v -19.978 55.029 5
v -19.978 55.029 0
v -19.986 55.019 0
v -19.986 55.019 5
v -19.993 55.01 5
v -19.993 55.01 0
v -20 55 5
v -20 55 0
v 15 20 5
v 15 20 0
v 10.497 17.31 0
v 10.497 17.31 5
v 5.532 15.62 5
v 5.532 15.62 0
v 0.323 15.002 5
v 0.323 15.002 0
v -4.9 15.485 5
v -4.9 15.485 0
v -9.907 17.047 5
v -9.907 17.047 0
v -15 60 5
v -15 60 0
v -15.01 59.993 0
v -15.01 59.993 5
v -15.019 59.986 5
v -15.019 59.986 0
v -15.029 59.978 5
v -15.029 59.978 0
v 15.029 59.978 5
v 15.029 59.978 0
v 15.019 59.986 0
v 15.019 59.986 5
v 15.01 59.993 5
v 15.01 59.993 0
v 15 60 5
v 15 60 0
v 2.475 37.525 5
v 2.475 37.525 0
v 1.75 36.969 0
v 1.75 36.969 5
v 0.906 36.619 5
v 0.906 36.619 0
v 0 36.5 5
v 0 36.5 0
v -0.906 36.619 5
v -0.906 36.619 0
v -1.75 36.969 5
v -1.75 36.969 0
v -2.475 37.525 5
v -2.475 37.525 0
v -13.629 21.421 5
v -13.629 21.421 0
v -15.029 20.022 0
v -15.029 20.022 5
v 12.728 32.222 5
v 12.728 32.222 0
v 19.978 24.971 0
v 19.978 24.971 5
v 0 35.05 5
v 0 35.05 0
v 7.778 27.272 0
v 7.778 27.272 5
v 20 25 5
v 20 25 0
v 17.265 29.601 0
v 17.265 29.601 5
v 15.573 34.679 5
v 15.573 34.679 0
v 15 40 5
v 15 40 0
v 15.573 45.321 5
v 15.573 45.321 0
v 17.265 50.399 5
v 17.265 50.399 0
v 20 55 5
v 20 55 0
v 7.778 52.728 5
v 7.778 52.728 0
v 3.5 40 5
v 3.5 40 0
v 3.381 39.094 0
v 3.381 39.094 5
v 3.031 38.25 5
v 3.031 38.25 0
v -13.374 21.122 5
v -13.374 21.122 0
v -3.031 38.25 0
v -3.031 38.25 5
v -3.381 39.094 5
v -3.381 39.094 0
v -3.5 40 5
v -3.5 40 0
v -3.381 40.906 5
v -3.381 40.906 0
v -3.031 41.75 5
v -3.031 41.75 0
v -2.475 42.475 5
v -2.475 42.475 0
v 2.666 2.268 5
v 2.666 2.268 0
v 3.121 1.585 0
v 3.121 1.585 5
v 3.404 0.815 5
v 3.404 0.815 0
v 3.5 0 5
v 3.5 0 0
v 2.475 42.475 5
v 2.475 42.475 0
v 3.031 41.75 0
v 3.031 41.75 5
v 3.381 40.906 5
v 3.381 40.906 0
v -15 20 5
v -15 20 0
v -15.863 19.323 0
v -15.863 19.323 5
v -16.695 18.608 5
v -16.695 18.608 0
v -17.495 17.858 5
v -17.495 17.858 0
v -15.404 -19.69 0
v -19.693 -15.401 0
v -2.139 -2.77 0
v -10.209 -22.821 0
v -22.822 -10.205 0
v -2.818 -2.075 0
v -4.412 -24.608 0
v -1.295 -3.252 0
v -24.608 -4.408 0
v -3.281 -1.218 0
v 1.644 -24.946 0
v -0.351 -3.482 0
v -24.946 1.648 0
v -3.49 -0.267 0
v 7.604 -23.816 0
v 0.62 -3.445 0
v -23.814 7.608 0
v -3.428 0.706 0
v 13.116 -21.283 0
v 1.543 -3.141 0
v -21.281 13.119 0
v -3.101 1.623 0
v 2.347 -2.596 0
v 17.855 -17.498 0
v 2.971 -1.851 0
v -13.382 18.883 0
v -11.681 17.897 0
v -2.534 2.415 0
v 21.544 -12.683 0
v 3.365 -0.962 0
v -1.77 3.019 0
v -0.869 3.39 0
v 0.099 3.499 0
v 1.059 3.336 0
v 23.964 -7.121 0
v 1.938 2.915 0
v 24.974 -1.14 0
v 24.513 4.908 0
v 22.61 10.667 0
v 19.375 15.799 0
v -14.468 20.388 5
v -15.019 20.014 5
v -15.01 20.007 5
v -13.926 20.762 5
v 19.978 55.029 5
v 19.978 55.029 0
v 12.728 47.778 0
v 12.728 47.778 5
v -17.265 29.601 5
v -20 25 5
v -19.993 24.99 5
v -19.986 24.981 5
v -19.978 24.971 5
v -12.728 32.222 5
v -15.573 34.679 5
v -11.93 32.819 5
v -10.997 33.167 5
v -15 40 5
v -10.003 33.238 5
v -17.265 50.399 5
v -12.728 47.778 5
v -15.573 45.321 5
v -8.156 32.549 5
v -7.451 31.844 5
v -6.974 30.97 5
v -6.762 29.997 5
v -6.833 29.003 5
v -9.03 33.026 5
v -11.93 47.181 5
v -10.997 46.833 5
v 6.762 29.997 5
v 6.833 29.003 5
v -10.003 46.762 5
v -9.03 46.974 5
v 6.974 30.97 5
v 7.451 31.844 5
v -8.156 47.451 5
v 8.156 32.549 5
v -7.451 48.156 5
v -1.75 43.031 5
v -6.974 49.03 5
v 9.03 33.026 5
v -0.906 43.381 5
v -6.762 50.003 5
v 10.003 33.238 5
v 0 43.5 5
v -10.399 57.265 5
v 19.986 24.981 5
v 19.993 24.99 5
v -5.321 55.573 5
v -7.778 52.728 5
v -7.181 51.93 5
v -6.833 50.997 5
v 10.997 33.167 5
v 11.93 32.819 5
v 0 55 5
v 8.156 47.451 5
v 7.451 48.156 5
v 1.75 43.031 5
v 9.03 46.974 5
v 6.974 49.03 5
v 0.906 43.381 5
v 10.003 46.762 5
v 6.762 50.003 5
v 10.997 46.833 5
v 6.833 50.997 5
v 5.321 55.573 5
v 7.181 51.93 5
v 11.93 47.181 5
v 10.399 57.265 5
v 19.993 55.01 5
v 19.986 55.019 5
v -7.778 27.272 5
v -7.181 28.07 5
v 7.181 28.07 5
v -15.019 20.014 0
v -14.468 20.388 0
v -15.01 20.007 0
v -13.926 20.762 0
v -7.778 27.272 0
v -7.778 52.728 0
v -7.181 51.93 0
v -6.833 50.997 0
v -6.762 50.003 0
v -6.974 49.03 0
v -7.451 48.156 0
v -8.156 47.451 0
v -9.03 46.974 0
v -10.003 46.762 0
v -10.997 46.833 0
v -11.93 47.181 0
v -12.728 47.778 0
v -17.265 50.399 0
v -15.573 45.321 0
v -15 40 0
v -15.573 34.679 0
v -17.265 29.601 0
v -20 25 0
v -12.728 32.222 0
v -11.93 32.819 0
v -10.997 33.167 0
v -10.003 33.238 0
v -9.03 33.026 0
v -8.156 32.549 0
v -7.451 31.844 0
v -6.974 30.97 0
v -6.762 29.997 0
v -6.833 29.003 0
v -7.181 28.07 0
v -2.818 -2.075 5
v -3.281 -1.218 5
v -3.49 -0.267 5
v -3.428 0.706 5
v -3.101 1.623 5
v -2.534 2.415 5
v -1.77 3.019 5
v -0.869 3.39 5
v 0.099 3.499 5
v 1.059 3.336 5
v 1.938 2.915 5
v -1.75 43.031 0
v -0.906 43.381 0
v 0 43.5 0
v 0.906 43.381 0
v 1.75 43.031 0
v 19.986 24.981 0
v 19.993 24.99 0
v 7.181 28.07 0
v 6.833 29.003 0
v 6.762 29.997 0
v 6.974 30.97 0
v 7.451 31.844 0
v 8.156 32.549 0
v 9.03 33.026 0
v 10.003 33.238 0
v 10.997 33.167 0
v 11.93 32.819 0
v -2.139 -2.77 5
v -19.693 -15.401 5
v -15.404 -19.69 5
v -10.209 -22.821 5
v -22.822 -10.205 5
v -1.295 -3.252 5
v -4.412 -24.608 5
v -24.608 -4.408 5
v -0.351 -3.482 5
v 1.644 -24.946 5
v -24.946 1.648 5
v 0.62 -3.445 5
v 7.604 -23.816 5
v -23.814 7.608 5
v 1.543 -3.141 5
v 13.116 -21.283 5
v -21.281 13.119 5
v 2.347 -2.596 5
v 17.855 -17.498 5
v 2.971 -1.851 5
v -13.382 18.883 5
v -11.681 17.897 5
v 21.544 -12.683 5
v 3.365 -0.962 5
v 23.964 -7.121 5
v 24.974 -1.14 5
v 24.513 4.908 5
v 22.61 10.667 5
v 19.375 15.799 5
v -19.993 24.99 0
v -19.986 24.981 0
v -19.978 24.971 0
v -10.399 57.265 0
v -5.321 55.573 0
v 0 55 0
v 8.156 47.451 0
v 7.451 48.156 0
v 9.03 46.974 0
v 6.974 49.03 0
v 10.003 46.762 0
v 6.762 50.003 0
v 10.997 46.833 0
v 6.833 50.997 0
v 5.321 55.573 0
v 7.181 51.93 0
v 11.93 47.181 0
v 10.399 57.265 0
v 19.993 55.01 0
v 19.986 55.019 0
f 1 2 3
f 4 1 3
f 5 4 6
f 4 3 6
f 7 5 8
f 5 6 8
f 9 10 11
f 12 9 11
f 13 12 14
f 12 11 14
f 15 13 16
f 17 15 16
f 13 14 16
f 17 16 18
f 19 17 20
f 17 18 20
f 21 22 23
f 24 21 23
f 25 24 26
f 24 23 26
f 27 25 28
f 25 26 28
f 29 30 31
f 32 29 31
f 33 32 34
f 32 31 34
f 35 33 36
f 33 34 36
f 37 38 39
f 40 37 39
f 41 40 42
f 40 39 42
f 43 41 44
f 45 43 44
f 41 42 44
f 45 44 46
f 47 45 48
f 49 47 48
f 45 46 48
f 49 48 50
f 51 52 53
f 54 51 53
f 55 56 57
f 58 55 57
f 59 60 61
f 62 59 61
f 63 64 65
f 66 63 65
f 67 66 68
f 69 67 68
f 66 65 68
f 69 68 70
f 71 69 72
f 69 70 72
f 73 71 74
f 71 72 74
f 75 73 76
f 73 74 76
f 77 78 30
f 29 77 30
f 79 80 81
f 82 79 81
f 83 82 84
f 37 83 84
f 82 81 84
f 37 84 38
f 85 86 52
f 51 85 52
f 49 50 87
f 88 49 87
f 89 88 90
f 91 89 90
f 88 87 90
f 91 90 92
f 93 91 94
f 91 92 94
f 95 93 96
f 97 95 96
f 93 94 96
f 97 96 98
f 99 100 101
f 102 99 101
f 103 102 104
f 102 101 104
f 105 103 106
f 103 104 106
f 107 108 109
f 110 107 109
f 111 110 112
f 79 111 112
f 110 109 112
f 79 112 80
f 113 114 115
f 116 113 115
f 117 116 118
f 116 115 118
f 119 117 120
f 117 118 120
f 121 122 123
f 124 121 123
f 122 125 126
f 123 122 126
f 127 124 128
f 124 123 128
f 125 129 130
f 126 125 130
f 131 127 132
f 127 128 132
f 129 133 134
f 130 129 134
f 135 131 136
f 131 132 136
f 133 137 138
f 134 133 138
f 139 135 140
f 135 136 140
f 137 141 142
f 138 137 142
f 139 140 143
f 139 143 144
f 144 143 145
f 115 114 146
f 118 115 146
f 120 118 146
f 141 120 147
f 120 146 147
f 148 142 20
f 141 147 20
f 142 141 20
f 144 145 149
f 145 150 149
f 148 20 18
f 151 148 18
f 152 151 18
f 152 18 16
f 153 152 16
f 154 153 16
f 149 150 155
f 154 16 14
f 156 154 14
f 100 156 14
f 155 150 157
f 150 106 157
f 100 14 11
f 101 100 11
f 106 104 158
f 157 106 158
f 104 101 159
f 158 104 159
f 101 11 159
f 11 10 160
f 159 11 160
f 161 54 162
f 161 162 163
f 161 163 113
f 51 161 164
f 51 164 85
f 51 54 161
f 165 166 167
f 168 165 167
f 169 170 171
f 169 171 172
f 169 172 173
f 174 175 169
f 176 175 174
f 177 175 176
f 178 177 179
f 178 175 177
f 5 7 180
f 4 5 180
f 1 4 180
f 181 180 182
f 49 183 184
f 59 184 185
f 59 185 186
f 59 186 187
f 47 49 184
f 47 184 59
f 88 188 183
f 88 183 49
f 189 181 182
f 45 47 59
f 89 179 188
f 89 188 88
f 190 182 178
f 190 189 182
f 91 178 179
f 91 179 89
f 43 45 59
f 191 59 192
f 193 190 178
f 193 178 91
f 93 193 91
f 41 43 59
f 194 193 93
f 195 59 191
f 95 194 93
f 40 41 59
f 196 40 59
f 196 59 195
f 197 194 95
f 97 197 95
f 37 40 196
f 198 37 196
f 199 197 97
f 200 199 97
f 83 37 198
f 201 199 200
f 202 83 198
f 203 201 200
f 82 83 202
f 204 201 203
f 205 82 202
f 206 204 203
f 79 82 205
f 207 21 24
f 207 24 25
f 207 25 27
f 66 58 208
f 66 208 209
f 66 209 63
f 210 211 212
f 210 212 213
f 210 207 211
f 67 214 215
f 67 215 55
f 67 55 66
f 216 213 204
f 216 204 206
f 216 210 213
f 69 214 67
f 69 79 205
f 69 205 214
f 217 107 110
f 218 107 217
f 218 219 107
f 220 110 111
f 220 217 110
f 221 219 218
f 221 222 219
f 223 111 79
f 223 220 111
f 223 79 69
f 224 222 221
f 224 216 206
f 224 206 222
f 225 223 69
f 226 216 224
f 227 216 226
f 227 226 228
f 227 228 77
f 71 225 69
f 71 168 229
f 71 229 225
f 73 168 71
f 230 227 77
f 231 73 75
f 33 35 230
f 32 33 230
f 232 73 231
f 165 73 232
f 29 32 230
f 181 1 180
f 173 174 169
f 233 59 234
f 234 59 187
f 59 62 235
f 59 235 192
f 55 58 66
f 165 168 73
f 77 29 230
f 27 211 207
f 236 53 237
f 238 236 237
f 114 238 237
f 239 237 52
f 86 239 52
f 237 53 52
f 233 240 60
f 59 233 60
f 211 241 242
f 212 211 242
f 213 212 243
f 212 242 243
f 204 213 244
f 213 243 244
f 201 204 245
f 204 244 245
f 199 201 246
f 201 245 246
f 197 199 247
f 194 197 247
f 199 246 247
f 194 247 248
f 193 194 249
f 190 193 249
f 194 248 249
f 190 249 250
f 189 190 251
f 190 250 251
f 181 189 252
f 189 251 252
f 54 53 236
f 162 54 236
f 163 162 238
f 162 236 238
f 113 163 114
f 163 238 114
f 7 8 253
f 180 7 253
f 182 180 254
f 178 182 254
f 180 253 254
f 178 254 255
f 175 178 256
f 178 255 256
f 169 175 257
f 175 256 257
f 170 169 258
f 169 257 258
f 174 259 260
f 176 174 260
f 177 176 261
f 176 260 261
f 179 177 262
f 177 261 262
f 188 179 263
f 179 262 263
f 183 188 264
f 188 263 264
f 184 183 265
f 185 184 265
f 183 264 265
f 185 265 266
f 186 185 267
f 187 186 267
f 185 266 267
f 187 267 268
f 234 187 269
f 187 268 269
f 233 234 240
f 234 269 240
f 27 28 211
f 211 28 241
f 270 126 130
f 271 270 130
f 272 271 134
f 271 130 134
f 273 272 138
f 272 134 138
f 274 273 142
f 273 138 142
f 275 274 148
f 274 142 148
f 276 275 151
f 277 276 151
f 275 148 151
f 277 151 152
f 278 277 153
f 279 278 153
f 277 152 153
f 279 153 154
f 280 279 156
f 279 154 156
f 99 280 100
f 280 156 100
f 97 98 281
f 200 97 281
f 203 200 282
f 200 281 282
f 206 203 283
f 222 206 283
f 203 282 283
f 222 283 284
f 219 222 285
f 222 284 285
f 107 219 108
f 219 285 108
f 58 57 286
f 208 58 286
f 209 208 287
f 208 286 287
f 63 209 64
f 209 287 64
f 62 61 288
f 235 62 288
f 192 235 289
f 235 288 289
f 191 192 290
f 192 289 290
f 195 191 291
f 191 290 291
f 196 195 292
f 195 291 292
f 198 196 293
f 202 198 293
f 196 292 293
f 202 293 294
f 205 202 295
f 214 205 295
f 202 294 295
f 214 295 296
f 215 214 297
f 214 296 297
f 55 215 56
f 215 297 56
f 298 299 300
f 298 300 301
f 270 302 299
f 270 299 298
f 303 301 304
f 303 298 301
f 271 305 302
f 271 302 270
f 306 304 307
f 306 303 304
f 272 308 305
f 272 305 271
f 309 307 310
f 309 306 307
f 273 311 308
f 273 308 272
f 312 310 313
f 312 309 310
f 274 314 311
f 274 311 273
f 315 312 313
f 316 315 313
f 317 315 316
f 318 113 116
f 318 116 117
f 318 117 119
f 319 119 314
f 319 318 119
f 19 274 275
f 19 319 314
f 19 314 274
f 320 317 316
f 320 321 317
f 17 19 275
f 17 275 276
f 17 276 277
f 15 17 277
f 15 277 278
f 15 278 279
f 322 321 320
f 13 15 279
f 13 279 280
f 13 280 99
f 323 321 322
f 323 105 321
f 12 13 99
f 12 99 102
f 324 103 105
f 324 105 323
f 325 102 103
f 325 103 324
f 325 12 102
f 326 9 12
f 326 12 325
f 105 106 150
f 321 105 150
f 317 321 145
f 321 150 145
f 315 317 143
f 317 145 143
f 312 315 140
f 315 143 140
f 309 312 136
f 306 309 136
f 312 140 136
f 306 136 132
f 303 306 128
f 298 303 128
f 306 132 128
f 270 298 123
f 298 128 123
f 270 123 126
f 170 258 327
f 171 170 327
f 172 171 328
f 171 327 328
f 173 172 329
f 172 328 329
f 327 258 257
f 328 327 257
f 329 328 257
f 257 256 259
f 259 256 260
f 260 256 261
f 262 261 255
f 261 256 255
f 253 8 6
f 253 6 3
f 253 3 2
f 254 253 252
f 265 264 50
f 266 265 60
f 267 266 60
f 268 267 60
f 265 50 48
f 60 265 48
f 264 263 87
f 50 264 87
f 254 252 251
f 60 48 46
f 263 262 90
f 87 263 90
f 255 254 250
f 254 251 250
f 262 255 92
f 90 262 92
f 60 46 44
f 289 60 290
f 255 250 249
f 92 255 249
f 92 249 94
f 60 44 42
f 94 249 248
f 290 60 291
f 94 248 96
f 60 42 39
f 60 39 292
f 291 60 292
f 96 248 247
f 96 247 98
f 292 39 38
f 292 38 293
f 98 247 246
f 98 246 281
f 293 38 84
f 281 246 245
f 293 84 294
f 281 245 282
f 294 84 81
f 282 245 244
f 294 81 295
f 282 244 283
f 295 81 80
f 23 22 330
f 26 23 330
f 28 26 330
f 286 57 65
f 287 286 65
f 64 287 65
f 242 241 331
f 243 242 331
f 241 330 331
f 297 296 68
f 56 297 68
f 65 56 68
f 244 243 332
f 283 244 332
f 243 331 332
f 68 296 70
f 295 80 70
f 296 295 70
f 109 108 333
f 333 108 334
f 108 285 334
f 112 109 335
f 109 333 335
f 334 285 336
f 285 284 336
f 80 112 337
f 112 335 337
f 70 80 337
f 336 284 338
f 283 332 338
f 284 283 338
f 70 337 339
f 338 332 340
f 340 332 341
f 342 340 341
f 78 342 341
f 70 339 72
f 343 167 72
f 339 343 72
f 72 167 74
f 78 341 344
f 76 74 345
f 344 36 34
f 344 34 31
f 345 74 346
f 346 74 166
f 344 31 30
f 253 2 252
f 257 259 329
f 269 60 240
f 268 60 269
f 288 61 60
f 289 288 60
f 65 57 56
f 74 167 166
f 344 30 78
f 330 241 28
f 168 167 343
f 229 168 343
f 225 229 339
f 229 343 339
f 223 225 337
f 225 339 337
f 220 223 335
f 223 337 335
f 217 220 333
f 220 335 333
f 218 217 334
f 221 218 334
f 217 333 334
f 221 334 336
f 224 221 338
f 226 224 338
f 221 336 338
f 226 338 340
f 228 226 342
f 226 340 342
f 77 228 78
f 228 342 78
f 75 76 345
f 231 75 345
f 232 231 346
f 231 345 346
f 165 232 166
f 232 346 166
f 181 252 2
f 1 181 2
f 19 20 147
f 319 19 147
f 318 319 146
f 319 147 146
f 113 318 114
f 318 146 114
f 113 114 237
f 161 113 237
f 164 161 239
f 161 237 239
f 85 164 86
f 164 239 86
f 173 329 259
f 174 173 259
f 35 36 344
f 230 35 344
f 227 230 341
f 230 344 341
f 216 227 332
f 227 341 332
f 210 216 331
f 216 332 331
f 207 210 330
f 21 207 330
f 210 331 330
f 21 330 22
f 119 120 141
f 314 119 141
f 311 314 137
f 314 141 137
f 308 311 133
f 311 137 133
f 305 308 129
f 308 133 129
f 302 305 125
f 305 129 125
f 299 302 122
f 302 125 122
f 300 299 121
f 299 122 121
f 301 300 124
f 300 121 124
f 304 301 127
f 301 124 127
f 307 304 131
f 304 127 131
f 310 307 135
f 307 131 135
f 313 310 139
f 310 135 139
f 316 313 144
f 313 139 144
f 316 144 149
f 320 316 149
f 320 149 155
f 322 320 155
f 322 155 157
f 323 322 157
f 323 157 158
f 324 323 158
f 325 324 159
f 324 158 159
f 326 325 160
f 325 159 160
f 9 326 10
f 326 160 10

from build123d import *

# Parameters (mm, degrees)
F1_DEPTH = 5


# Not quite as in the source:
# - a feature names something its author has since deleted; it is built from what else it names


with BuildPart() as f1:
    # F0 (on Top) → F1 (new body)
    with BuildSketch(Plane.XY):
        with BuildLine():
            ThreePointArc((-9.9073162791, 17.0468938018), (-12.5408855394, 18.3730217116), (-15, 20))
            ThreePointArc((-15, 20), (-16.2829033321, 18.9701623366), (-17.4952976137, 17.8581791179))
            Line((-17.4952976137, 17.8581791179), (-2.8184302399, -2.0751990225))
            ThreePointArc((-2.8184302399, -2.0751990225), (-2.172900388, 2.7438119294), (2.6658084384, 2.2679209355))
            Line((2.6658084384, 2.2679209355), (-9.9073162791, 17.0468938018))
        make_face()
        with BuildLine():
            Line((-2.8184302399, -2.0751990225), (-17.4952976137, 17.8581791179))
            ThreePointArc((-17.4952976137, 17.8581791179), (1.6442252637, -24.9458718685), (15, 20))
            ThreePointArc((15, 20), (2.9434785416, 15.1738860456), (-9.9073162791, 17.0468938018))
            Line((-9.9073162791, 17.0468938018), (2.6658084384, 2.2679209355))
            ThreePointArc((2.6658084384, 2.2679209355), (3.2848386212, 1.2082364143), (3.5, 0))
            ThreePointArc((3.5, 0), (1.0921296078, -3.325244791), (-2.8184302399, -2.0751990225))
        make_face()
    extrude(amount=F1_DEPTH)


with BuildPart() as f1b:
    # F0 (on Top) → F1, piece 2 (new body)
    with BuildSketch(Plane.XY):
        with BuildLine():
            ThreePointArc((-15.0286973301, 20.0215552016), (-15.0143525332, 20.0107724509), (-15, 20))
            ThreePointArc((-15, 20), (-14.1981285052, 20.5770052959), (-13.3740867349, 21.1218797461))
            Line((-13.3740867349, 21.1218797461), (-13.6288791735, 21.4213733582))
            Line((-13.6288791735, 21.4213733582), (-15.0286973301, 20.0215552016))
        make_face()
    extrude(amount=F1_DEPTH)


with BuildPart() as f1c:
    # F0 (on Top) → F1, piece 3 (new body)
    with BuildSketch(Plane.XY):
        with BuildLine():
            ThreePointArc((-12.7279220614, 32.2218254069), (-7.7781745931, 32.2218254069), (-7.7781745931, 27.2720779386))
            Line((-7.7781745931, 27.2720779386), (0, 35.0502525317))
            Line((0, 35.0502525317), (-2.4748737374, 37.5251262691))
            Line((-2.4748737374, 37.5251262691), (-4.9497474683, 40))
            Line((-4.9497474683, 40), (-12.7279220614, 32.2218254069))
        make_face()
        with BuildLine():
            Line((0, 35.0502525317), (7.7781745931, 27.2720779386))
            ThreePointArc((7.7781745931, 27.2720779386), (7.7781745931, 32.2218254069), (12.7279220614, 32.2218254069))
            Line((12.7279220614, 32.2218254069), (4.9497474683, 40))
            Line((4.9497474683, 40), (2.4748737427, 37.5251262744))
            Line((2.4748737427, 37.5251262744), (0, 35.0502525317))
        make_face()
        with BuildLine():
            Line((12.7279220614, 32.2218254069), (19.9784447984, 24.9713026699))
            ThreePointArc((19.9784447984, 24.9713026699), (19.9892275491, 24.9856474668), (20, 25))
            ThreePointArc((20, 25), (15, 40), (20, 55))
            ThreePointArc((20, 55), (19.9892275491, 55.0143525332), (19.9784447984, 55.0286973301))
            Line((19.9784447984, 55.0286973301), (12.7279220614, 47.7781745931))
            Line((12.7279220614, 47.7781745931), (4.9497474683, 40))
            Line((4.9497474683, 40), (12.7279220614, 32.2218254069))
        make_face()
        with BuildLine():
            ThreePointArc((-20, 25), (-19.9892275491, 24.9856474668), (-19.9784447984, 24.9713026699))
            Line((-19.9784447984, 24.9713026699), (-12.7279220614, 32.2218254069))
            Line((-12.7279220614, 32.2218254069), (-4.9497474683, 40))
            Line((-4.9497474683, 40), (-12.7279220614, 47.7781745931))
            Line((-12.7279220614, 47.7781745931), (-19.9784447984, 55.0286973301))
            ThreePointArc((-19.9784447984, 55.0286973301), (-19.9892275491, 55.0143525332), (-20, 55))
            ThreePointArc((-20, 55), (-15, 40), (-20, 25))
        make_face()
        with BuildLine():
            Line((-2.4748737374, 37.5251262691), (0, 35.0502525317))
            Line((0, 35.0502525317), (2.4748737427, 37.5251262744))
            ThreePointArc((2.4748737427, 37.5251262744), (3.7e-09, 36.5), (-2.4748737374, 37.5251262691))
        make_face()
        with BuildLine():
            Line((-4.9497474683, 40), (-2.4748737374, 37.5251262691))
            ThreePointArc((-2.4748737374, 37.5251262691), (-3.5, 40.0000000023), (-2.4748737342, 42.4748737342))
            Line((-2.4748737342, 42.4748737342), (-4.9497474683, 40))
        make_face()
        with BuildLine():
            ThreePointArc((3.5, 40), (3.2335783661, 38.6606079923), (2.4748737427, 37.5251262744))
            Line((2.4748737427, 37.5251262744), (4.9497474683, 40))
            Line((4.9497474683, 40), (2.4748737094, 42.4748737589))
            ThreePointArc((2.4748737094, 42.4748737589), (3.2335783571, 41.3393920295), (3.5, 40))
        make_face()
        with BuildLine():
            Line((-12.7279220614, 47.7781745931), (-4.9497474683, 40))
            Line((-4.9497474683, 40), (-2.4748737342, 42.4748737342))
            Line((-2.4748737342, 42.4748737342), (0, 44.9497474683))
            Line((0, 44.9497474683), (-7.7781745931, 52.7279220614))
            ThreePointArc((-7.7781745931, 52.7279220614), (-7.7781745931, 47.7781745931), (-12.7279220614, 47.7781745931))
        make_face()
        with BuildLine():
            Line((2.4748737094, 42.4748737589), (4.9497474683, 40))
            Line((4.9497474683, 40), (12.7279220614, 47.7781745931))
            ThreePointArc((12.7279220614, 47.7781745931), (7.7781745931, 47.7781745931), (7.7781745931, 52.7279220614))
            Line((7.7781745931, 52.7279220614), (0, 44.9497474683))
            Line((0, 44.9497474683), (2.4748737094, 42.4748737589))
        make_face()
        with BuildLine():
            Line((0, 44.9497474683), (-2.4748737342, 42.4748737342))
            ThreePointArc((-2.4748737342, 42.4748737342), (-1.75e-08, 43.5), (2.4748737094, 42.4748737589))
            Line((2.4748737094, 42.4748737589), (0, 44.9497474683))
        make_face()
        with BuildLine():
            Line((-7.7781745931, 52.7279220614), (0, 44.9497474683))
            Line((0, 44.9497474683), (7.7781745931, 52.7279220614))
            Line((7.7781745931, 52.7279220614), (15.0286973301, 59.9784447984))
            ThreePointArc((15.0286973301, 59.9784447984), (15.0143525332, 59.9892275491), (15, 60))
            ThreePointArc((15, 60), (0, 55), (-15, 60))
            ThreePointArc((-15, 60), (-15.0143525332, 59.9892275491), (-15.0286973301, 59.9784447984))
            Line((-15.0286973301, 59.9784447984), (-7.7781745931, 52.7279220614))
        make_face()
    extrude(amount=F1_DEPTH)


solid = Compound([f1.part, f1b.part, f1c.part])
